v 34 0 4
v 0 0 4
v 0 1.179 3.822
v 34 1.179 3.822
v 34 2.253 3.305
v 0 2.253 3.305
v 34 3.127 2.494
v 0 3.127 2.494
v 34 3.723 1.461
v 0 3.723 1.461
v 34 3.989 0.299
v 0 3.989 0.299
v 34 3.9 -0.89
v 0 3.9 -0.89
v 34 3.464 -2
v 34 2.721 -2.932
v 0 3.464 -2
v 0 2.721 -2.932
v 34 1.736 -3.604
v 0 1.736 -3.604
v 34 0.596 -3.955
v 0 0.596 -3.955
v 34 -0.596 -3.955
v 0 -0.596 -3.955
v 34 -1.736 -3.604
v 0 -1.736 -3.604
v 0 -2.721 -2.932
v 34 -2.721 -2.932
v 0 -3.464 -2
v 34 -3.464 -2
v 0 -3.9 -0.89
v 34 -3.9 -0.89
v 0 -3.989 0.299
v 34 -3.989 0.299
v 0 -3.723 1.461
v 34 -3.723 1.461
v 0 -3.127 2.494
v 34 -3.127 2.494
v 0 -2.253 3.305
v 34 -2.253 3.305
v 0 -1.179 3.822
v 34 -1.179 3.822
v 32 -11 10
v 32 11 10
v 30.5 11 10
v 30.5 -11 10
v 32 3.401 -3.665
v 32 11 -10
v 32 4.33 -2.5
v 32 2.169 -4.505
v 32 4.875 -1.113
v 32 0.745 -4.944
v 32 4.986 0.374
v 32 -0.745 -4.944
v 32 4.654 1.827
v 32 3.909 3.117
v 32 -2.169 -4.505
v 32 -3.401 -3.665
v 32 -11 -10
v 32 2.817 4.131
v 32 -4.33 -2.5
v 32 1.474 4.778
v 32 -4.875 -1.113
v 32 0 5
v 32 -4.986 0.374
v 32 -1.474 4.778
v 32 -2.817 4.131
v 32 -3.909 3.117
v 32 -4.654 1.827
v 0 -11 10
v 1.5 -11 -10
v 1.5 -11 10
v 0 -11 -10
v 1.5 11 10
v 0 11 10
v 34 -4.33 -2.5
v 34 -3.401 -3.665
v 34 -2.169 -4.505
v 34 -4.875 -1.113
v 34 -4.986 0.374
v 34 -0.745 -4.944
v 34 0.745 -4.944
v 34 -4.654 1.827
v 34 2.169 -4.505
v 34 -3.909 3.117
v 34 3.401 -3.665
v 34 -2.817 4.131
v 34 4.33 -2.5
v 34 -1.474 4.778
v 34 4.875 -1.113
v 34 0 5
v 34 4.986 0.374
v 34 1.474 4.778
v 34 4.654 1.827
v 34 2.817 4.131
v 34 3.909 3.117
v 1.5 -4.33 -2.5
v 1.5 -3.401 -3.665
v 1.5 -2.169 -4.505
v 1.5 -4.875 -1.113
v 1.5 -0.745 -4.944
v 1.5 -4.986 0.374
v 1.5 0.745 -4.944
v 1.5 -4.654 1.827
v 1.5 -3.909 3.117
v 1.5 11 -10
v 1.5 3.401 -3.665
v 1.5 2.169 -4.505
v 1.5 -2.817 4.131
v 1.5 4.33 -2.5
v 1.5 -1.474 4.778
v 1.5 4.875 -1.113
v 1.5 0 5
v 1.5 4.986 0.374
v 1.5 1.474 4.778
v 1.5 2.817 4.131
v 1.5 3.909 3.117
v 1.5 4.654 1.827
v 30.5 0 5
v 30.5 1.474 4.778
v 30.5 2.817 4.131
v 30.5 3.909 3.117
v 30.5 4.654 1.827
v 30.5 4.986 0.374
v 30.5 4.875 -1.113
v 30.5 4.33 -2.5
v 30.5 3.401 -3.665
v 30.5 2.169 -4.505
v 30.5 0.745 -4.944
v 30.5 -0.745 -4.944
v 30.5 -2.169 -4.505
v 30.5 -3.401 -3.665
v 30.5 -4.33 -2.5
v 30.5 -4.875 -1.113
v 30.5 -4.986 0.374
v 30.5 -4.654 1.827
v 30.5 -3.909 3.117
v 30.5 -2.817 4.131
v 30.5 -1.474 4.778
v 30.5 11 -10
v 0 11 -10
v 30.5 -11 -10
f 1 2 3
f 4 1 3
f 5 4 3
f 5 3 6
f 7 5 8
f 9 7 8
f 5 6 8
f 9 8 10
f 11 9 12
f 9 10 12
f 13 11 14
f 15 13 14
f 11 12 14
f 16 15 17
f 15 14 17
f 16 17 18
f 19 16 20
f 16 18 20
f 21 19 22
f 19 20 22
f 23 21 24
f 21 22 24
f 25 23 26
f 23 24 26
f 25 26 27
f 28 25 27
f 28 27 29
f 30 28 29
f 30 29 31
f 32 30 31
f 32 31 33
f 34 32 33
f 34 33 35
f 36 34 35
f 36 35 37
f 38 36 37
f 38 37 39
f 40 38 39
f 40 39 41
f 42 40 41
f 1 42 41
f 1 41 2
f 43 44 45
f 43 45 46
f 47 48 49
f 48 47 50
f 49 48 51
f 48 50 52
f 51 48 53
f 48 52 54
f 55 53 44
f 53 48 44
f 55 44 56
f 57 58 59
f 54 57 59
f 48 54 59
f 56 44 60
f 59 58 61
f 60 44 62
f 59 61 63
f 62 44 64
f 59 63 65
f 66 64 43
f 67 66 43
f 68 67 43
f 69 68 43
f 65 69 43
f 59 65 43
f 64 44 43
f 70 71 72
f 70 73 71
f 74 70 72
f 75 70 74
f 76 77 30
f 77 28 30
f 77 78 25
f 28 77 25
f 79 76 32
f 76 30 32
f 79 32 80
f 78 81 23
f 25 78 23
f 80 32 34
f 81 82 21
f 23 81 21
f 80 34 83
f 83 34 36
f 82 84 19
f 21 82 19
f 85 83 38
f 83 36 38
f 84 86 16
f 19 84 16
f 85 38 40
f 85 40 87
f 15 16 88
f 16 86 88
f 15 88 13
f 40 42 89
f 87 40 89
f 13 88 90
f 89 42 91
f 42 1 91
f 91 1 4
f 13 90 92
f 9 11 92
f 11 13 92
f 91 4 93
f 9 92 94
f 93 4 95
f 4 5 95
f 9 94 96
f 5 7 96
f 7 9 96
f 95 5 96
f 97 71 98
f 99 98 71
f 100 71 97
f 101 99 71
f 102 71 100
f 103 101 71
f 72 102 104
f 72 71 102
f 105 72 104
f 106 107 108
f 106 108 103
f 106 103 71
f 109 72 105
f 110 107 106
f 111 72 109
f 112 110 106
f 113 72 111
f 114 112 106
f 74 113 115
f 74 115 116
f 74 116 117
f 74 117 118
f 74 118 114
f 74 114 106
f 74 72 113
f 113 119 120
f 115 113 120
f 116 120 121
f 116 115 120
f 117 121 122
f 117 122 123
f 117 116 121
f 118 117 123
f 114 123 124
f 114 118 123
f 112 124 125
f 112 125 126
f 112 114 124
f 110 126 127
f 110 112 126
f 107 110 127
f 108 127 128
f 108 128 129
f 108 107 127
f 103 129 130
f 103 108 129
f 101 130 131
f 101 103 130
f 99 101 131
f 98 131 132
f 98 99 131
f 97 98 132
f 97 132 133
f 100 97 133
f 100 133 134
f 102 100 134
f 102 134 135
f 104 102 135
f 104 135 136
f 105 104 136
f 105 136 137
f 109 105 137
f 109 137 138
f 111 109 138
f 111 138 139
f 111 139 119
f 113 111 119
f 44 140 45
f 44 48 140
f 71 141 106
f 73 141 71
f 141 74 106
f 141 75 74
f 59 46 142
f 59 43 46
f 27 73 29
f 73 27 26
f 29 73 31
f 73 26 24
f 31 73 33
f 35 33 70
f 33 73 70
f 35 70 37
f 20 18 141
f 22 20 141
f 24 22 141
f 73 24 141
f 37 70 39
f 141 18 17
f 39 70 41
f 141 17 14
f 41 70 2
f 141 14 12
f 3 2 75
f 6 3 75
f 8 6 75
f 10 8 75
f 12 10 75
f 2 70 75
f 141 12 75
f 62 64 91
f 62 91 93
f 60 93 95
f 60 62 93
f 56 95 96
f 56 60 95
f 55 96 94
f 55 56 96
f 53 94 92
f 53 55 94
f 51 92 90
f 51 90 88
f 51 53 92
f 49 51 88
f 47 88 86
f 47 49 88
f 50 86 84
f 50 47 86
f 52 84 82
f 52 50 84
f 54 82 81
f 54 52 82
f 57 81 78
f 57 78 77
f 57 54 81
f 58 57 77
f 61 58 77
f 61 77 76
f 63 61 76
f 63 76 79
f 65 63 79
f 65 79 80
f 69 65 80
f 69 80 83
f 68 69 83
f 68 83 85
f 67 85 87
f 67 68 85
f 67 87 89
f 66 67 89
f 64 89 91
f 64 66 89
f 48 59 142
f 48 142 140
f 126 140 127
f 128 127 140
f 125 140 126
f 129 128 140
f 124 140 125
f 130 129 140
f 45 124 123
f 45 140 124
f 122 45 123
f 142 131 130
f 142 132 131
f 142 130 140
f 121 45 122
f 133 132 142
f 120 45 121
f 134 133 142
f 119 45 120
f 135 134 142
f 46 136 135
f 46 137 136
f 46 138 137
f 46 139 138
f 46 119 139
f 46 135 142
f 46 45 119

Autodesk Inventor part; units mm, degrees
ref_plane "YZ Plane" through (0, 0, 0) normal (1, 0, 0) x (0, 1, 0)
ref_plane "XZ Plane" through (0, 0, 0) normal (0, 1, 0) x (-1, 0, 0)
ref_plane "XY Plane" through (0, 0, 0) normal (0, 0, 1) x (1, 0, 0)
sketch "Эскиз1" plane through (0, 0, 0) normal (1, 0, 0) x (0, 1, 0)
  line L0 (-11, 10) -> (11, 10)
  line L1 (11, 10) -> (11, -10)
  line L2 (11, -10) -> (-11, -10)
  line L3 (-11, -10) -> (-11, 10)
  line L4 (-11, 10) -> (11, -10) construction
  line L5 (11, 10) -> (-11, -10) construction
  circle A0 centre (0, 0) radius 5
  dimension "d1" = 22
  dimension "d2" = 20
  dimension "d3" = 10
extrude "Выдавливание1" add sketch "Эскиз1" along normal blind 1.5
ref_plane "РабПлоскость1" through (16, 0, 0) normal (1, 0, 0) x (0, 0, -1)
mirror "Зеркальное отражение1" about plane through (16, 0, 0) normal (1, 0, 0) of "Выдавливание1"
sketch "Эскиз2" plane through (0, 0, 0) normal (-1, 0, 0) x (0, 0, 1)
  circle A0 centre (0, 0) radius 5 projected
  circle A1 centre (0, 0) radius 4
  dimension "d7" = 8
extrude "Выдавливание2" add sketch "Эскиз2" against normal blind 34
properties part number "frame" material "Пластмасса, непрозрачная, черная"
